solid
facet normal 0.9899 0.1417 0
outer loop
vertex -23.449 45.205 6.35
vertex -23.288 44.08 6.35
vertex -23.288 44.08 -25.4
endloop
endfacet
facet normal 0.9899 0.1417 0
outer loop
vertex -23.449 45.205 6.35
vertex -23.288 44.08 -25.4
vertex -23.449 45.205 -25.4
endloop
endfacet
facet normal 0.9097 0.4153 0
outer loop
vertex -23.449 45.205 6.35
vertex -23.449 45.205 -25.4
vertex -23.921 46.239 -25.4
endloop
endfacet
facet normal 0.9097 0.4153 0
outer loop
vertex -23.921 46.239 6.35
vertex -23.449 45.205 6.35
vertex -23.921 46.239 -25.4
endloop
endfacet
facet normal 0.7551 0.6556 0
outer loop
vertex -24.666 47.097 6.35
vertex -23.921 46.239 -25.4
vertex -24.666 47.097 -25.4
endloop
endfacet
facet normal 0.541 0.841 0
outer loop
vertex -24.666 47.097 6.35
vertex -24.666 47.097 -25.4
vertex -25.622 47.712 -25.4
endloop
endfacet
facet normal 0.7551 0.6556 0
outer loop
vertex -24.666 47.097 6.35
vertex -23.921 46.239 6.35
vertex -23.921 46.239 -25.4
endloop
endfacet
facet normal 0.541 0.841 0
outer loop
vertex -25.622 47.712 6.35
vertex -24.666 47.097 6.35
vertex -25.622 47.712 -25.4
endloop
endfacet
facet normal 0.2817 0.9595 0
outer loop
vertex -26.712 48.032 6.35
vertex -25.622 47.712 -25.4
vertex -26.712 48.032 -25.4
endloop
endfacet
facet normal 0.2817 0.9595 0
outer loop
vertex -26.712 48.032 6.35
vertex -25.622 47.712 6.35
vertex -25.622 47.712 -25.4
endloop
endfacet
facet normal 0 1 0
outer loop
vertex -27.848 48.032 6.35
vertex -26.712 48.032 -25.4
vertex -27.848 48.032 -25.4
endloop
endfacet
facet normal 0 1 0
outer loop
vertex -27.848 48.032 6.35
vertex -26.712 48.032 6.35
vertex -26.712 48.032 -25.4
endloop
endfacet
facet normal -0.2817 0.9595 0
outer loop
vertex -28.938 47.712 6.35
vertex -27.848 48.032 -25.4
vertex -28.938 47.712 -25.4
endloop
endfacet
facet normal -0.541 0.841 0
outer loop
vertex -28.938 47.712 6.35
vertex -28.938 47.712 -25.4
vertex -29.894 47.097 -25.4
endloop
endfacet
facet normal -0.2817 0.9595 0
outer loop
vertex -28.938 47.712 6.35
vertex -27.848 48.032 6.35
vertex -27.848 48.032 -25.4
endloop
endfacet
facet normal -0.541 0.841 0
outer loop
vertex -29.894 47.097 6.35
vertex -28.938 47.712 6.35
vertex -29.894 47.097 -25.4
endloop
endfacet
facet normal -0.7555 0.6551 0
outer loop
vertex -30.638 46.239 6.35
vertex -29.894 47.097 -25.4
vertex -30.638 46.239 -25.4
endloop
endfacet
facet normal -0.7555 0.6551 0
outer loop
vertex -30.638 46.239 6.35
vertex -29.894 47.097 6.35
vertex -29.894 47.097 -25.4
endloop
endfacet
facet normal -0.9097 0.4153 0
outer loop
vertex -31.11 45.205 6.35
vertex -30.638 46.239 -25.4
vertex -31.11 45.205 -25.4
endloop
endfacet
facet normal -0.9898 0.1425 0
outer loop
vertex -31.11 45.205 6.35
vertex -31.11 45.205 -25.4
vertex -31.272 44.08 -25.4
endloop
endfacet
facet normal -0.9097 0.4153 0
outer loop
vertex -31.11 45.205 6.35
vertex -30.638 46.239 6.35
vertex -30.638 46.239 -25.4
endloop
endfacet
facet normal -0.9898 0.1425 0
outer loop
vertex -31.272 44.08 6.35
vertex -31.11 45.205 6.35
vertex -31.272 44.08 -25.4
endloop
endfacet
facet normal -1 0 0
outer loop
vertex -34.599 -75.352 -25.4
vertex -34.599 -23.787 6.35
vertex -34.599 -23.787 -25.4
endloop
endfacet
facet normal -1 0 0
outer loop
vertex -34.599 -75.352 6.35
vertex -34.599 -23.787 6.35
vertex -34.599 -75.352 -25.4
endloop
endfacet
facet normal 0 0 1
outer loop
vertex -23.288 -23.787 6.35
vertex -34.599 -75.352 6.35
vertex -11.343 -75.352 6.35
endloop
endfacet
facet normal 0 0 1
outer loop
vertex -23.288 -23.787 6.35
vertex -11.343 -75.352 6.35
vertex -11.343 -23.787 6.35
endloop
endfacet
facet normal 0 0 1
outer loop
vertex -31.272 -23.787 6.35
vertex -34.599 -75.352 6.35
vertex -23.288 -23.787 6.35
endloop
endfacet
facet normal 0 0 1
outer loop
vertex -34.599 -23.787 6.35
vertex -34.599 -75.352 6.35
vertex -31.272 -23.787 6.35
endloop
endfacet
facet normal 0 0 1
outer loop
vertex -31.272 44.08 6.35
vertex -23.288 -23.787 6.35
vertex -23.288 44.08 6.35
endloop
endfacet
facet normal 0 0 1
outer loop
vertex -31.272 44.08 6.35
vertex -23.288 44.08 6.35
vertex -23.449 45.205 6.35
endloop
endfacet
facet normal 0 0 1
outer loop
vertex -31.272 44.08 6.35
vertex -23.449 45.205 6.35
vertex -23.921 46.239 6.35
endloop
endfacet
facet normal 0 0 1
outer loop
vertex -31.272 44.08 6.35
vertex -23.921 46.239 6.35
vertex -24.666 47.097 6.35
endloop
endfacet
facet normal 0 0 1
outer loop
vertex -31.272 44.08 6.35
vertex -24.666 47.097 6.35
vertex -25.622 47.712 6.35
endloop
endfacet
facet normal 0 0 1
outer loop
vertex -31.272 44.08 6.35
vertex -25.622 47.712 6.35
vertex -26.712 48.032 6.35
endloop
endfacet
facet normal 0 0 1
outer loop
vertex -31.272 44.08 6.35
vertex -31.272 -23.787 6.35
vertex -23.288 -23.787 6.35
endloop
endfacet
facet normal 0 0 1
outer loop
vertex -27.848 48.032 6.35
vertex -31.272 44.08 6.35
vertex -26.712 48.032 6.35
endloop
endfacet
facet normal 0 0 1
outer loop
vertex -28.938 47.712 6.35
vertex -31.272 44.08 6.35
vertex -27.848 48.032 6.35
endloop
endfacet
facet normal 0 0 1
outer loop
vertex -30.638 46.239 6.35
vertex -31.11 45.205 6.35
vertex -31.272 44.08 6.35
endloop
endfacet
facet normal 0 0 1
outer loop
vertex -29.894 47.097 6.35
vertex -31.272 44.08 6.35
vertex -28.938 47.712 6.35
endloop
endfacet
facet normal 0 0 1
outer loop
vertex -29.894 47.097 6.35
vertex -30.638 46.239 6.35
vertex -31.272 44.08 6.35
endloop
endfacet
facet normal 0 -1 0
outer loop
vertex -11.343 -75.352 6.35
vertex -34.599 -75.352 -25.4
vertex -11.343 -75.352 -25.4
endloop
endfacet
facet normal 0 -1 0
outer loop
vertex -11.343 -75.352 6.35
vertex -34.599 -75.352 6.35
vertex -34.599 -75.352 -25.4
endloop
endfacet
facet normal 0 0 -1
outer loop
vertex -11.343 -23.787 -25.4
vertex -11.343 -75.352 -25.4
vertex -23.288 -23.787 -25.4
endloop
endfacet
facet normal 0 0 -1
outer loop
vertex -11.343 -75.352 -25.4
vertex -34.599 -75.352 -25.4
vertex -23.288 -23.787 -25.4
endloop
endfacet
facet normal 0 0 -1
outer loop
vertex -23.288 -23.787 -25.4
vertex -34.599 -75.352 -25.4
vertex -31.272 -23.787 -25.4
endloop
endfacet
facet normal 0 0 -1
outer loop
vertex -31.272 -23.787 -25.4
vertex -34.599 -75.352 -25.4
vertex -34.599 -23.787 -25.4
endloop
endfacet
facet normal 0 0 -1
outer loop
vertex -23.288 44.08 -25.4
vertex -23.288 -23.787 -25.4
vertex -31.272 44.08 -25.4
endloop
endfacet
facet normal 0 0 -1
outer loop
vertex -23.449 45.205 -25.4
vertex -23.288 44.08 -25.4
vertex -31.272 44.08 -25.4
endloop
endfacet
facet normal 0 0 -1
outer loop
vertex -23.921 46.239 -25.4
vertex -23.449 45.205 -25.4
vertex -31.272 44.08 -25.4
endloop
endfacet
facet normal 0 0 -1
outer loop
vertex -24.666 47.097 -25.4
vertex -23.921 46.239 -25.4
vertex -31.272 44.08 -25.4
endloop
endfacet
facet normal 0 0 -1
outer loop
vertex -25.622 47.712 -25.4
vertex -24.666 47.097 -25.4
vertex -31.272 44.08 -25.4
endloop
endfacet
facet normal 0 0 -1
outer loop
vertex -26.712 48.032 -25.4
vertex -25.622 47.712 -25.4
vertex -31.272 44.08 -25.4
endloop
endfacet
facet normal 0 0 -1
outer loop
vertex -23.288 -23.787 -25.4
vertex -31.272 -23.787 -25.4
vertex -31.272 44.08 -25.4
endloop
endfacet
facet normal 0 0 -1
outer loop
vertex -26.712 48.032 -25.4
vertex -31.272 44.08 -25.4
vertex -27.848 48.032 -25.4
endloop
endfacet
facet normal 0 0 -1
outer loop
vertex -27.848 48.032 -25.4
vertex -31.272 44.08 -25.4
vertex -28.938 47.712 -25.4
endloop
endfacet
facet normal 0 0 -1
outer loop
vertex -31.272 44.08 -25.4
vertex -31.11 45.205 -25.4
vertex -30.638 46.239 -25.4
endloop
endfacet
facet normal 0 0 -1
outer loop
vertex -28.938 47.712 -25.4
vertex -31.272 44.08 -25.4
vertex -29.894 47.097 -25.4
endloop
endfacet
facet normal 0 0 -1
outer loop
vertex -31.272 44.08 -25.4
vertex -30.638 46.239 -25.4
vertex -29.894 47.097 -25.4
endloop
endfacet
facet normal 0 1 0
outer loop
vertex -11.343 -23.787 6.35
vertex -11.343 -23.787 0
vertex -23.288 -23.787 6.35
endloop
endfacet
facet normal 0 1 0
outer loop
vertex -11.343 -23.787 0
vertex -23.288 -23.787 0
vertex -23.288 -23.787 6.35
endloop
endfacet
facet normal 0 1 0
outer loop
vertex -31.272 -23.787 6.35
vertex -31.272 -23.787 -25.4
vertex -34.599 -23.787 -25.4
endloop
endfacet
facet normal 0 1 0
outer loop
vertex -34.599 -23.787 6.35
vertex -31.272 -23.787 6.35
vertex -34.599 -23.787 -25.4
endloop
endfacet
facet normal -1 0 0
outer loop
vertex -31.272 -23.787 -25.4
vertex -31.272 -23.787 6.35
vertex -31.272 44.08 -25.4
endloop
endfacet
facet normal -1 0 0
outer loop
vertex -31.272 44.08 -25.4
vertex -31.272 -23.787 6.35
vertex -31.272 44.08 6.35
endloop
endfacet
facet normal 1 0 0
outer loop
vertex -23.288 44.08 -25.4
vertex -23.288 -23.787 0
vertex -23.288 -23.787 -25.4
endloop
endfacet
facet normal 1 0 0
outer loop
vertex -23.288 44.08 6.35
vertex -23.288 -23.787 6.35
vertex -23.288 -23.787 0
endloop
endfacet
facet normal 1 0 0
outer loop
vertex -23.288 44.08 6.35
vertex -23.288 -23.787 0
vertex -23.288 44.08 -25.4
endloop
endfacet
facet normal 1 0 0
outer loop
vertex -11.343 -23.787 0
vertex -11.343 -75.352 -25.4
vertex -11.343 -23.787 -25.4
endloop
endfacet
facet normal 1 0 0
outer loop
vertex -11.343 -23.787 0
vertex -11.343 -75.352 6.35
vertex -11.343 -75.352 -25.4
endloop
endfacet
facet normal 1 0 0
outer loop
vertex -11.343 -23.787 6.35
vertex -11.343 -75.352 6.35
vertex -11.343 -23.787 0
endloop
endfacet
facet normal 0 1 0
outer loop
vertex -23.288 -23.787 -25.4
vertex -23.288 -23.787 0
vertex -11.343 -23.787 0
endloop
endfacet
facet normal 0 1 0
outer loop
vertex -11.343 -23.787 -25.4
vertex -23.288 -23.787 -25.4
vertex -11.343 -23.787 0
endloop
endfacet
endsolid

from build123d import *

# Parameters (mm, degrees)
F0_W     = 7.9843644053
F0_H     = 67.8671114147
F1_DEPTH = 6.35
F2_DEPTH = 7.62
F3_DEPTH = 25.4


with BuildPart() as f1:
    # F0 (on Top) → F1 (new body)
    with BuildSketch(Plane.XY):
        with Locations((-27.2799162194, 10.146798566)):
            Rectangle(F0_W, F0_H)
        with BuildLine():
            ThreePointArc((-23.2877340168, 44.0803542733), (-27.2799162194, 48.072536476), (-31.2720984221, 44.0803542733))
            Line((-31.2720984221, 44.0803542733), (-23.2877340168, 44.0803542733))
        make_face()
        Polygon((-34.5989204943, -23.7867571414), (-34.5989204943, -75.3524526954), (-18.9628694206, -75.3524526954), (-18.9628694206, -23.7867571414), (-23.2877340168, -23.7867571414), (-31.2720984221, -23.7867571414), align=None)
    extrude(amount=F1_DEPTH)

    # F2 (add): a face of the model
    f2_faces = [f1.faces().sort_by_distance(p)[0] for p in [
        (-18.9628694206, -49.5696049184, 3.175),
    ]]
    extrude(f2_faces, amount=F2_DEPTH)

    # F3 (add): a face of the model
    f3_faces = [f1.faces().sort_by_distance(p)[0] for p in [
        (-24.3540524425, -29.8961498867, 0),
    ]]
    extrude(f3_faces, amount=F3_DEPTH)


solid = f1.part
